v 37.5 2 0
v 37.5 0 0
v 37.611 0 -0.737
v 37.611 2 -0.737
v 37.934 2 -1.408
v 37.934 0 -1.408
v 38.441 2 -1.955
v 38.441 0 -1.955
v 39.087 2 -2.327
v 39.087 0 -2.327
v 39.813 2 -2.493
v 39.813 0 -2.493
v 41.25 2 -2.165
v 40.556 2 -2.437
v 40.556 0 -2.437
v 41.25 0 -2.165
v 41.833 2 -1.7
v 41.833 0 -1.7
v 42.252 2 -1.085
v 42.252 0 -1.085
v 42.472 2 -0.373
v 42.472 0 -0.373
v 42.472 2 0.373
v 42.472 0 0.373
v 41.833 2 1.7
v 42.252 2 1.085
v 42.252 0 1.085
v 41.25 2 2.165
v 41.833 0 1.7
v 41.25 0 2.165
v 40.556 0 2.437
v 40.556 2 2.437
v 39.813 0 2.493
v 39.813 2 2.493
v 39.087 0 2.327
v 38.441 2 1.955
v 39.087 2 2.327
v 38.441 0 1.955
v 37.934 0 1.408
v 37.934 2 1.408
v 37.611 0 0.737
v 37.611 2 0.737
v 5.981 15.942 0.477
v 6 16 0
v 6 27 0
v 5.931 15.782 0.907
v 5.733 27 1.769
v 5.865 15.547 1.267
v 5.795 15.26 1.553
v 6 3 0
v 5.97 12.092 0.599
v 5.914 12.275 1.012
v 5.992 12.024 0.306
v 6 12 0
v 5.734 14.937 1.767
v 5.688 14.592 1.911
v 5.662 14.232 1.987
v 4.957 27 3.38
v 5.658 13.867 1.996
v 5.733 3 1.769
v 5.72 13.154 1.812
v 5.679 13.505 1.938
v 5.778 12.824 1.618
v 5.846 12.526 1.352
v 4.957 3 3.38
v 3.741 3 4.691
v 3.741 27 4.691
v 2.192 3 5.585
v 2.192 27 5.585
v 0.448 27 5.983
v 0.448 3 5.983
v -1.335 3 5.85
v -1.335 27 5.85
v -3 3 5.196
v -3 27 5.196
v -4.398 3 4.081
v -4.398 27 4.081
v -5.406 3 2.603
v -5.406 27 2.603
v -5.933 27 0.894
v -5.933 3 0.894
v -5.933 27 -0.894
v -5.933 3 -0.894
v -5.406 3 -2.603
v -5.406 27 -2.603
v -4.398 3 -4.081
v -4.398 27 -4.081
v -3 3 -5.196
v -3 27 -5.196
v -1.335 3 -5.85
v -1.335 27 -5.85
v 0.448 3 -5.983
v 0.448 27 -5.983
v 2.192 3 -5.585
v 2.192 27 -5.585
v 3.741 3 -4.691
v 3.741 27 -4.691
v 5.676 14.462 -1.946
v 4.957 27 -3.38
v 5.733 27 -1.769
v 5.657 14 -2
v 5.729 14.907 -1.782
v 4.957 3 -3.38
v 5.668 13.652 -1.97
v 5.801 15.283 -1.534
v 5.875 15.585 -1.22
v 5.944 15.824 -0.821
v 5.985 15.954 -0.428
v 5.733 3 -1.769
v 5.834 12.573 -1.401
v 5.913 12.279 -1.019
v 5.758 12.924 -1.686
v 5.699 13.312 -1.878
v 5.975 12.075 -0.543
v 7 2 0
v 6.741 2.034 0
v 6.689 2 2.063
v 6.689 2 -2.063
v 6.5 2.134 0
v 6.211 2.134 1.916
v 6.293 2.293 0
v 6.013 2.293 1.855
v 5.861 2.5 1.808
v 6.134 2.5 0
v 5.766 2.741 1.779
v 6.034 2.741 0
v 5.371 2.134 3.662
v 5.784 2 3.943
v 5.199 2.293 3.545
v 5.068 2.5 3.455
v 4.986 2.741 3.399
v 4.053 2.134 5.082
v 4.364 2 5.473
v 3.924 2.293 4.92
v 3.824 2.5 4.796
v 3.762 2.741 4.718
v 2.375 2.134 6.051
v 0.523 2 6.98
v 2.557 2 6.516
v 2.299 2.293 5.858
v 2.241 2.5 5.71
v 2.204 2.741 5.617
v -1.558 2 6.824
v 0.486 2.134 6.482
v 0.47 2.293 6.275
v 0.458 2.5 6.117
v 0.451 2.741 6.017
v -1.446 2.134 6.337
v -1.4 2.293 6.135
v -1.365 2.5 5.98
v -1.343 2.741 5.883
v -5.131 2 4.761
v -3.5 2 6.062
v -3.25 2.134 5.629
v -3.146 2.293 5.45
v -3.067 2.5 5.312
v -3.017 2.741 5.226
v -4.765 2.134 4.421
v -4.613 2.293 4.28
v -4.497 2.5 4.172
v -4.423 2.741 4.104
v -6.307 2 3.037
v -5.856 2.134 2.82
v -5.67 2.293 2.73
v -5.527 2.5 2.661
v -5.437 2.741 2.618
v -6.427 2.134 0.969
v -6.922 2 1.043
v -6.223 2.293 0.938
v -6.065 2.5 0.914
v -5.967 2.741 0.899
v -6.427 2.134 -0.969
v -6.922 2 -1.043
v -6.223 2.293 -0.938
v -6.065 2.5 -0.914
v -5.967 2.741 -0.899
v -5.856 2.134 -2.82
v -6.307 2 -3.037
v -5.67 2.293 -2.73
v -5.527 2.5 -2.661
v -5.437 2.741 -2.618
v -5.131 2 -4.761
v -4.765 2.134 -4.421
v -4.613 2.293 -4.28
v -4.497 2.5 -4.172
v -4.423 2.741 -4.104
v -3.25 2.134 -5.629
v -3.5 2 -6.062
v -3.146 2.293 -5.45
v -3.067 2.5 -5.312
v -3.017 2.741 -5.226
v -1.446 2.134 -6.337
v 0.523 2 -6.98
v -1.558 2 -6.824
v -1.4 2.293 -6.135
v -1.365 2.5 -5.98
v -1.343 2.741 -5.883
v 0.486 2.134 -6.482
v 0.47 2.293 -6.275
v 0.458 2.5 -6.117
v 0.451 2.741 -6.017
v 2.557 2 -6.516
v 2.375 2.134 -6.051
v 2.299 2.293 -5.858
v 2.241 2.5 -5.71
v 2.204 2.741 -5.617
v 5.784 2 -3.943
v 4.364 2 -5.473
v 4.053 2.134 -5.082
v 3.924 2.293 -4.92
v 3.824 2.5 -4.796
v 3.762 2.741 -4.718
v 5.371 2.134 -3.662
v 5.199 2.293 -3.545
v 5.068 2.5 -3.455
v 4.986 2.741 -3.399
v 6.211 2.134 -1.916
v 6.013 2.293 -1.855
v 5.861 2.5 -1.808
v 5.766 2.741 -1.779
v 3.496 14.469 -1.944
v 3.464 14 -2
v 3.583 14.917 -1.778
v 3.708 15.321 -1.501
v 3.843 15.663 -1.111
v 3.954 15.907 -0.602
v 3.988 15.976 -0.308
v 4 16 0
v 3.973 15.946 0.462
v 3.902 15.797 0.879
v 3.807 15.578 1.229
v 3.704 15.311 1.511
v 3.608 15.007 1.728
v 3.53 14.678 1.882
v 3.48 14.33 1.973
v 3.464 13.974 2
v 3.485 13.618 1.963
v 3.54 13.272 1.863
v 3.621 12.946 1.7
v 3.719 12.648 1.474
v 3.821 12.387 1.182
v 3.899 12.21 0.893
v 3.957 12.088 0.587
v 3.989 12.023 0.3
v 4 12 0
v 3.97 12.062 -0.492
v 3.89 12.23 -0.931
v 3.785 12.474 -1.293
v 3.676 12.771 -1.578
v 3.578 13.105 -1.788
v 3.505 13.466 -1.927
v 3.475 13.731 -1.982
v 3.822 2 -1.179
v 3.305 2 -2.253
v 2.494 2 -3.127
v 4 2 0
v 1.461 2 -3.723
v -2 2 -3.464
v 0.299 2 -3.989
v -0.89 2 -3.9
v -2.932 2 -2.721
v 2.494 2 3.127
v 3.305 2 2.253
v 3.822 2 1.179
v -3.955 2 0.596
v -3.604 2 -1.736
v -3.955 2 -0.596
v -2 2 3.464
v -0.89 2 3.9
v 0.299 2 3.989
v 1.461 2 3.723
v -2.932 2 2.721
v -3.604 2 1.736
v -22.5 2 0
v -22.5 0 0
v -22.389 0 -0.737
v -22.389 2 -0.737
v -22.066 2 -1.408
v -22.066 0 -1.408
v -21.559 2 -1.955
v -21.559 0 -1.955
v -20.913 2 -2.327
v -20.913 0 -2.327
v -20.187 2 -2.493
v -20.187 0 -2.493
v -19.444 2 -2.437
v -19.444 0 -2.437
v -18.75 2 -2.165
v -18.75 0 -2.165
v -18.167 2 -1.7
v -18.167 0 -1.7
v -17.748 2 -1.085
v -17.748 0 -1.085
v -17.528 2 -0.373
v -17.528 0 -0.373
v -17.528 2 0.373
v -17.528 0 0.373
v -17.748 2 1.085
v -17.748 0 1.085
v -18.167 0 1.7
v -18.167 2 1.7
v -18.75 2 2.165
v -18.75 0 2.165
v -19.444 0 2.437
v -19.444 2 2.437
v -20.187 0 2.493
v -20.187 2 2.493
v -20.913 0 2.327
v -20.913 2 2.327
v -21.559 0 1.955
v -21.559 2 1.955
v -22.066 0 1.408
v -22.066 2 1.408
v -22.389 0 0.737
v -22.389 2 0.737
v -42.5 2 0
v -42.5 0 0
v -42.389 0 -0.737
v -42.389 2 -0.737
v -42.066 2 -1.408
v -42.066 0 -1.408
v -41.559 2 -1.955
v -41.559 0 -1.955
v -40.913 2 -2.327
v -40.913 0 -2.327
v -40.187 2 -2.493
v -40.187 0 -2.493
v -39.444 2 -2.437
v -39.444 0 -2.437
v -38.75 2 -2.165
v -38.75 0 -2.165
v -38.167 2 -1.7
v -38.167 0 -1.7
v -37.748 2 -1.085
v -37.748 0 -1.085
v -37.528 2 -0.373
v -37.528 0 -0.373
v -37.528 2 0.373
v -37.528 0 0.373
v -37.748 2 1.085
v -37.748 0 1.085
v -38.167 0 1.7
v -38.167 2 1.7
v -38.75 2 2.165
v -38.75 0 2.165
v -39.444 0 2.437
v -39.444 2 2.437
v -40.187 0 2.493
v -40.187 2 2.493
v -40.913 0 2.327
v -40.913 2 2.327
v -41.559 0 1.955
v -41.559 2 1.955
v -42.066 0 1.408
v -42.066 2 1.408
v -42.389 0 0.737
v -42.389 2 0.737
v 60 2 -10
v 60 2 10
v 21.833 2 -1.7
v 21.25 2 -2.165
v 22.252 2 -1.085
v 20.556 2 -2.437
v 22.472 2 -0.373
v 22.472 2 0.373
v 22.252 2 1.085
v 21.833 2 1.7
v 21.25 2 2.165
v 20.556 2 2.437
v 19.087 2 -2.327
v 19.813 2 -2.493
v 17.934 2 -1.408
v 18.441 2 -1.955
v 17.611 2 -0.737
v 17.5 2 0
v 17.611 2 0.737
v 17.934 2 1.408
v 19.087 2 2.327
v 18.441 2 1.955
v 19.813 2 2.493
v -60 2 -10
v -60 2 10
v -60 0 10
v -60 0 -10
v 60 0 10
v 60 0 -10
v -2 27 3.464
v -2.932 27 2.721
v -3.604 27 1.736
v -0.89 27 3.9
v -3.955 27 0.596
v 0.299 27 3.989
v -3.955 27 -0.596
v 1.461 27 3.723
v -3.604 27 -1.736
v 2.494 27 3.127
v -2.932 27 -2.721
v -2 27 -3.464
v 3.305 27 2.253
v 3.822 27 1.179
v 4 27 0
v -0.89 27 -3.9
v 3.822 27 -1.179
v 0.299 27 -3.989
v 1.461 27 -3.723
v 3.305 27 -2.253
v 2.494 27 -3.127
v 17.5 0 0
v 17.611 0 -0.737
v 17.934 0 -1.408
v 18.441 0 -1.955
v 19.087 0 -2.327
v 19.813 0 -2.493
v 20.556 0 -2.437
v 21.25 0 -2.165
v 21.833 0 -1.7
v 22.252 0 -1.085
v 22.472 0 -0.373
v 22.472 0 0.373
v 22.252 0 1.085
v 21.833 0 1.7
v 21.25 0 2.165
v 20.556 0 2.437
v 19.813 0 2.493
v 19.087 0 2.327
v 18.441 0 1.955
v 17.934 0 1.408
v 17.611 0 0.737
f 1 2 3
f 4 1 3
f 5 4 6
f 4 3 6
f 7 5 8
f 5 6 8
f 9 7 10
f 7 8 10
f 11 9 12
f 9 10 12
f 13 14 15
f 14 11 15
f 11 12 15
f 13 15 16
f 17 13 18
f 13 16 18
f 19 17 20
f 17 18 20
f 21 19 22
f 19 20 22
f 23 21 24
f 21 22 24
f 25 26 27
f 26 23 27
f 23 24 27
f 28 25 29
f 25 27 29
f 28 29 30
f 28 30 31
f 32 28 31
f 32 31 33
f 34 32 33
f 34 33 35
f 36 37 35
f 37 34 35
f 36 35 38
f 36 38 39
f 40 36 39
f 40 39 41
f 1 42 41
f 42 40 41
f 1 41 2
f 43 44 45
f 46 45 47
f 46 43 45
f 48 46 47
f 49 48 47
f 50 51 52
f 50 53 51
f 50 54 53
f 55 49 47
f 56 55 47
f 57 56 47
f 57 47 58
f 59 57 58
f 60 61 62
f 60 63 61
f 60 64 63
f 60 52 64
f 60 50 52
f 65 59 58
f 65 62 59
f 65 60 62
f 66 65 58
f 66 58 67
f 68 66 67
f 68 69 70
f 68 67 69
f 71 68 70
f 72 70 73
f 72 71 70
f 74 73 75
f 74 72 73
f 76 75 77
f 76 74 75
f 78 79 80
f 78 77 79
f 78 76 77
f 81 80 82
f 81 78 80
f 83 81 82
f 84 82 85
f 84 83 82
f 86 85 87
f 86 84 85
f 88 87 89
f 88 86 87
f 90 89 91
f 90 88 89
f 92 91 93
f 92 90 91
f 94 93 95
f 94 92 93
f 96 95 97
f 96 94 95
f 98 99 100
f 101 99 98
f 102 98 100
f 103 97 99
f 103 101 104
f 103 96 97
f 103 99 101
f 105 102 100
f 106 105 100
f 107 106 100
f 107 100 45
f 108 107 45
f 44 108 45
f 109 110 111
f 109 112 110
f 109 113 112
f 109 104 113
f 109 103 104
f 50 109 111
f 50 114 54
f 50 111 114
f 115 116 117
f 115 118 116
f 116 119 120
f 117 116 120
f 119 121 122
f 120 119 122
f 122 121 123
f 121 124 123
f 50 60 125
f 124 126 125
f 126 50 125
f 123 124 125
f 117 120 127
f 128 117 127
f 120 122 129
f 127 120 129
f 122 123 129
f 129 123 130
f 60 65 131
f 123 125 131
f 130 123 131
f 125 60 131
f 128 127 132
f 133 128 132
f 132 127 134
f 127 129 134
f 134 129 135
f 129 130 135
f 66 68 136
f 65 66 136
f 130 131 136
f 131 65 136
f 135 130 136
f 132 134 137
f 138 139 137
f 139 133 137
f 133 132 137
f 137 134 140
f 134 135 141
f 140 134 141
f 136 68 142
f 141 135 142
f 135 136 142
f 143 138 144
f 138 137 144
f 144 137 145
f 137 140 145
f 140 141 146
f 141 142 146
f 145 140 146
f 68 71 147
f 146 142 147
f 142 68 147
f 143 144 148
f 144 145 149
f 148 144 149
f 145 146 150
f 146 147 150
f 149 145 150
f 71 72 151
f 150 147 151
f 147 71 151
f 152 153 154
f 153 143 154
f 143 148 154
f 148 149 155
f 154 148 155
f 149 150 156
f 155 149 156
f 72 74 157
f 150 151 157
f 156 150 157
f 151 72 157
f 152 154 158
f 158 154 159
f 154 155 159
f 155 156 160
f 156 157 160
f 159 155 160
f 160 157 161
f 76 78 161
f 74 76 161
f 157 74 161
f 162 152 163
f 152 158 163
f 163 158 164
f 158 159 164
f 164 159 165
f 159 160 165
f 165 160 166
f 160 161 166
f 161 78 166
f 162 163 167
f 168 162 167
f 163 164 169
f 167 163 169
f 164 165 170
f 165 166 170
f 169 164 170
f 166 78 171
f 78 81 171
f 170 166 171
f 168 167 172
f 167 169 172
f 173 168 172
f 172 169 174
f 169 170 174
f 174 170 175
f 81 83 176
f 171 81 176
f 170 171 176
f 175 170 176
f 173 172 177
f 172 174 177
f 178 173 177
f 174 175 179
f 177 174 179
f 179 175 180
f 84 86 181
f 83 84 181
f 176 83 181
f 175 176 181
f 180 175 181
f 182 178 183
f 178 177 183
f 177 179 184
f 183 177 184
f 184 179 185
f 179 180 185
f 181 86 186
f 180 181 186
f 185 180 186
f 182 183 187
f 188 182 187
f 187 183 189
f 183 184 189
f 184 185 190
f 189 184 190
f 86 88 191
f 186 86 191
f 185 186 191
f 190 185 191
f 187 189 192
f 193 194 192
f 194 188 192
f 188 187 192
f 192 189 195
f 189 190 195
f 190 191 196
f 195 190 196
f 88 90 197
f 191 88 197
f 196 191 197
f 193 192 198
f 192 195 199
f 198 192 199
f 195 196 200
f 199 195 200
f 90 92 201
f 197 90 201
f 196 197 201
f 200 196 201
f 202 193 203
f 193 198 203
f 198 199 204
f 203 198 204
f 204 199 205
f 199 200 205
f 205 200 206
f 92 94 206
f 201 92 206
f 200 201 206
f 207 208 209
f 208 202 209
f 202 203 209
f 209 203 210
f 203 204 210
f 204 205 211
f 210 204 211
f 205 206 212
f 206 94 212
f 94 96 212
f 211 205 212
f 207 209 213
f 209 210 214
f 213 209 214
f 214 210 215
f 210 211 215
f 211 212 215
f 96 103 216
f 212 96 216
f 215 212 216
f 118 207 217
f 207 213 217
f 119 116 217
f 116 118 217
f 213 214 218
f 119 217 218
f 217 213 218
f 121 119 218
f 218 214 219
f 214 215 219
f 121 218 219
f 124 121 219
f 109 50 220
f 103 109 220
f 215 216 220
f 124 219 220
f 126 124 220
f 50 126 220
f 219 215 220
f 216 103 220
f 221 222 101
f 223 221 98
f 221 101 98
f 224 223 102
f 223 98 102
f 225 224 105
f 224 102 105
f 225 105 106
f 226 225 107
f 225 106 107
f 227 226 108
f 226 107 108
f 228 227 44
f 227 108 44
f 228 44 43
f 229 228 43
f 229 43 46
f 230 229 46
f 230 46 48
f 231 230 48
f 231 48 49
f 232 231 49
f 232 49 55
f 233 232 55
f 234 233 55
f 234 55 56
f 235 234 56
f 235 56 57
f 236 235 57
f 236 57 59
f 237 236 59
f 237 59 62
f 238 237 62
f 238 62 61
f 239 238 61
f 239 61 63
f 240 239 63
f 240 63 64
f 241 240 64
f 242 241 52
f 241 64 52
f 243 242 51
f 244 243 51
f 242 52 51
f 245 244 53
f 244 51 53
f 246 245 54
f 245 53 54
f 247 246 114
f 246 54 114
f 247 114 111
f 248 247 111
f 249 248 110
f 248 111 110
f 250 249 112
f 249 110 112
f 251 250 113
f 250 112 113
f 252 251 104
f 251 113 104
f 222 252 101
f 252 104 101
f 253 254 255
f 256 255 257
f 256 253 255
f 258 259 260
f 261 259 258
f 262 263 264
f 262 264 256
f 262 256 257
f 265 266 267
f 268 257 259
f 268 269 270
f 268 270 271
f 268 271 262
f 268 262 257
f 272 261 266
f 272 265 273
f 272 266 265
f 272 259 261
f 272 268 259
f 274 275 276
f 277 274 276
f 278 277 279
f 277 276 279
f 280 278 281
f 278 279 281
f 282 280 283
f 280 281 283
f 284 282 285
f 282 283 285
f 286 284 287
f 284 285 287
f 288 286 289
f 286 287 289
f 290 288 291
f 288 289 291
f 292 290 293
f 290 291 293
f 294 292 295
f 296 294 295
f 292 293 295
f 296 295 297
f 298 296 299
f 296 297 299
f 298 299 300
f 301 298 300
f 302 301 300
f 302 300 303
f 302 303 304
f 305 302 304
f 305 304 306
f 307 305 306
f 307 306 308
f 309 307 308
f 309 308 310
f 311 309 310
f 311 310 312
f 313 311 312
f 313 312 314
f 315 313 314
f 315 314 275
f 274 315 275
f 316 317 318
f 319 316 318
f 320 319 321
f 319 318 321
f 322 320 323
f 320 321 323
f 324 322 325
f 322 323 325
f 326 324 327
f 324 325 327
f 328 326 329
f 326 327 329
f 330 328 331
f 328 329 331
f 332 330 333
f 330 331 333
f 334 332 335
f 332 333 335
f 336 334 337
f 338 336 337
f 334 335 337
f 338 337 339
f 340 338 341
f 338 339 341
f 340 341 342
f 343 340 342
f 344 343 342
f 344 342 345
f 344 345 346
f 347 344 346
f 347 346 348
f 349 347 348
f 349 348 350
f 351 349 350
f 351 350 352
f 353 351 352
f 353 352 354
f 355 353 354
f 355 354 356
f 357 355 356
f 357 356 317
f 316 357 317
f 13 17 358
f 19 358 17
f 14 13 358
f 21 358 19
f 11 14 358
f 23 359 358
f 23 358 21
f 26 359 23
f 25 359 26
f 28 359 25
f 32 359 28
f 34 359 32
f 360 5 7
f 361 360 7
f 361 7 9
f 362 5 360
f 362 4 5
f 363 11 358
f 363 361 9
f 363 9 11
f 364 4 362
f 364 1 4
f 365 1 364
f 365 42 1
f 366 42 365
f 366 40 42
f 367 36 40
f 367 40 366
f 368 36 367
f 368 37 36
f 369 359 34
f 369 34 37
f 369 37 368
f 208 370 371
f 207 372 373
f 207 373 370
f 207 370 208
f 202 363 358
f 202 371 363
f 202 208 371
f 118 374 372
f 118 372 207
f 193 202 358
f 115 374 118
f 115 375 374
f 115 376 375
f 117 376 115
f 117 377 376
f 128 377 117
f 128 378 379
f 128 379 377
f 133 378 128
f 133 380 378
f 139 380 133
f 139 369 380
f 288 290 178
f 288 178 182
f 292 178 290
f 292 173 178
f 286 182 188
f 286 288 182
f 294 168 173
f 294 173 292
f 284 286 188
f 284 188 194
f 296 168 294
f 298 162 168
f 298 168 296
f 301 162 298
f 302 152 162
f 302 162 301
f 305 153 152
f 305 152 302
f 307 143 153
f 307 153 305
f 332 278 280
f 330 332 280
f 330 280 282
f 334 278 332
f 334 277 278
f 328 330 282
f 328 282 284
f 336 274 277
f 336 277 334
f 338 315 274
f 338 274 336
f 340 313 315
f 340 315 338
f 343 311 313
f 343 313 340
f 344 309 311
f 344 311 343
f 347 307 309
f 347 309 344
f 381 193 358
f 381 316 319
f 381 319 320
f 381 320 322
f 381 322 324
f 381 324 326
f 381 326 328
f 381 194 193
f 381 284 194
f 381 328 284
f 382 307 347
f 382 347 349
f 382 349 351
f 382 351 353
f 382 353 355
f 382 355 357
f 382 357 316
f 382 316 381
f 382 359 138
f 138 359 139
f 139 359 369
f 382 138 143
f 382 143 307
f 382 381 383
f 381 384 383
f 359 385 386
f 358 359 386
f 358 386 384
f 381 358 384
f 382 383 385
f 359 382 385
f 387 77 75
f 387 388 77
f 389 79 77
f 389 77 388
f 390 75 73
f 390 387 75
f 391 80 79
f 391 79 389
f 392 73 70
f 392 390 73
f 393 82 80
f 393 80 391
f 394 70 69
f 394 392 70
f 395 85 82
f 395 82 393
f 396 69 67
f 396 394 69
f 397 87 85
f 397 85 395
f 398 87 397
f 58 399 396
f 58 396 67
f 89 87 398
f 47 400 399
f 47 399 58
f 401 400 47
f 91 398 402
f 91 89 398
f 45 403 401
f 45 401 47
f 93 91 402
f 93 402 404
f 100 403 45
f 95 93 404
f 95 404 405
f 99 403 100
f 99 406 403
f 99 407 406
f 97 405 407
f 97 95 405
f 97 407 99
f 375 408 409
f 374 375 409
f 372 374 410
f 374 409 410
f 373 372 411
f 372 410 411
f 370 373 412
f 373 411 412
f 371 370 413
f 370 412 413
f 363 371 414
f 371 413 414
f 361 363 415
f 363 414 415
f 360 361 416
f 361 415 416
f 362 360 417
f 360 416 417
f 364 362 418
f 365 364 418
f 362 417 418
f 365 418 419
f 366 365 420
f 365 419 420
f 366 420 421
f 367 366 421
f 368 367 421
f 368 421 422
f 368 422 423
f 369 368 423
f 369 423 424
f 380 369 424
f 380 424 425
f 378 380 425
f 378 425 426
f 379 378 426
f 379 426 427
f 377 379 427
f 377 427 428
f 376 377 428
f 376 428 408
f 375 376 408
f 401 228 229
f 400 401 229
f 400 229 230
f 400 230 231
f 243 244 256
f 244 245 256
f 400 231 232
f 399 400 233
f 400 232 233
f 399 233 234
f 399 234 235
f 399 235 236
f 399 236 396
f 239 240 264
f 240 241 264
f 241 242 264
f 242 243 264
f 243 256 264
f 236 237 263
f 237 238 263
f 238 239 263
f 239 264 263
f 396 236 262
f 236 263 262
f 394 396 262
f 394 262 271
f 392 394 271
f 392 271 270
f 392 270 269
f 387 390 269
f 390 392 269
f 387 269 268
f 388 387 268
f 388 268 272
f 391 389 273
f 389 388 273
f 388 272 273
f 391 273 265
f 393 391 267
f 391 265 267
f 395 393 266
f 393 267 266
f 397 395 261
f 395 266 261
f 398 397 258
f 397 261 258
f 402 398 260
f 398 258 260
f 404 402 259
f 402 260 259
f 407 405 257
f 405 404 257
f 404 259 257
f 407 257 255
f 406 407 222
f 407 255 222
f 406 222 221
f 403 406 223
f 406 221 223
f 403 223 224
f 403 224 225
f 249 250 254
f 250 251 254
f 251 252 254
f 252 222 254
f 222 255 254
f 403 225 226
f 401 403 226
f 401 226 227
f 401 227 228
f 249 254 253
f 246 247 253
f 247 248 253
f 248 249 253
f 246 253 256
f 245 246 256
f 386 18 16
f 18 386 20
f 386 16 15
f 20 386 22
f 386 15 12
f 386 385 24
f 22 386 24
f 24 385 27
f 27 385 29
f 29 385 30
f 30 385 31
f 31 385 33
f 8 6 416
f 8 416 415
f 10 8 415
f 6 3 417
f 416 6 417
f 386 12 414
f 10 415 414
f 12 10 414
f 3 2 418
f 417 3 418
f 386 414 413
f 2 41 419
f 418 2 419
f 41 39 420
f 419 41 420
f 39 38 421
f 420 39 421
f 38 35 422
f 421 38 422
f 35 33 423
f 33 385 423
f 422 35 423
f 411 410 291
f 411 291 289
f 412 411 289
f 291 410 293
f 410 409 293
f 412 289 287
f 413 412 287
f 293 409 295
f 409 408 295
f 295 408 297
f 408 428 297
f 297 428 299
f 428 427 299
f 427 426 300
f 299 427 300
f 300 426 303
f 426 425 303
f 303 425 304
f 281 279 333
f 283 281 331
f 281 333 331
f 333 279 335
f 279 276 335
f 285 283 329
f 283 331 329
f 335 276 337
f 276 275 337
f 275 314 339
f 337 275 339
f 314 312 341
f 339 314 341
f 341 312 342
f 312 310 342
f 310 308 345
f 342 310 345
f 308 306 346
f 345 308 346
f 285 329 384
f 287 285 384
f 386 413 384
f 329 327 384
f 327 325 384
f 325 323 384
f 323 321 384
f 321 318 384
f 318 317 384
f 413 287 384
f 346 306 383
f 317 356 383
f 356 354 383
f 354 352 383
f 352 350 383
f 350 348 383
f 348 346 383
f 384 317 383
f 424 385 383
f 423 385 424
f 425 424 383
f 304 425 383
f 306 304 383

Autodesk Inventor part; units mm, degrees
ref_plane "YZ Plane" through (0, 0, 0) normal (1, 0, 0) x (0, 1, 0)
ref_plane "XZ Plane" through (0, 0, 0) normal (0, 1, 0) x (-1, 0, 0)
sketch "Sketch1" plane through (0, 0, 0) normal (0, 1, 0) x (-1, 0, 0)
  line L0 (60, 10) -> (-60, 10)
  line L1 (-60, 10) -> (-60, -10)
  line L2 (-60, -10) -> (60, -10)
  line L3 (60, -10) -> (60, 10)
  line L4 (60, 10) -> (-60, -10) construction
  line L5 (-60, 10) -> (60, -10) construction
  line L6 (0, 0) -> (20, 0)
  line L7 (20, 0) -> (40, 0)
  line L8 (0, 0) -> (-20, 0)
  line L9 (-20, 0) -> (-40, 0)
  circle A0 centre (-20, 0) radius 2.5
  circle A1 centre (-40, 0) radius 2.5
  circle A2 centre (20, 0) radius 2.5
  circle A3 centre (40, 0) radius 2.5
  dimension "d0" = 120
  dimension "d1" = 20
  dimension "d2" = 20
  dimension "d3" = 20
  dimension "d4" = 20
  dimension "d5" = 20
  dimension "d6" = 5
  dimension "d7" = 5
  dimension "d8" = 5
  dimension "d9" = 5
extrude "Extrusion1" add sketch "Sketch1" along normal blind 2
sketch "Sketch2" plane through (0, 2, 0) normal (0, 1, 0) x (1, 0, 0)
  circle A0 centre (0, 0) radius 4
  circle A1 centre (0, 0) radius 6
  dimension "d12" = 8
  dimension "d13" = 12
extrude "Extrusion2" add sketch "Sketch2" along normal blind 25
fillet "Fillet1" radius 1 1 edges at (-6, 2, 0)
ref_plane "Work Plane1" through (6, 2, 0) normal (1, 0, 0) x (0, 0, -1)
sketch "Sketch3" plane through (6, 2, 0) normal (1, 0, 0) x (0, 0, -1)
  line L0 (0, 0) -> (0, 12)
  circle A0 centre (0, 12) radius 2
  point P0 (0, -2)
  dimension "d17" = 12
  dimension "d18" = 4
extrude "Extrusion3" cut sketch "Sketch3" against normal blind 5
thread "Thread1" size "M4x0.7" class "6H" standard "ANSI Metric M Profile" length 15
properties part number "2020_ax_connector" material "Aluminum 6061"
